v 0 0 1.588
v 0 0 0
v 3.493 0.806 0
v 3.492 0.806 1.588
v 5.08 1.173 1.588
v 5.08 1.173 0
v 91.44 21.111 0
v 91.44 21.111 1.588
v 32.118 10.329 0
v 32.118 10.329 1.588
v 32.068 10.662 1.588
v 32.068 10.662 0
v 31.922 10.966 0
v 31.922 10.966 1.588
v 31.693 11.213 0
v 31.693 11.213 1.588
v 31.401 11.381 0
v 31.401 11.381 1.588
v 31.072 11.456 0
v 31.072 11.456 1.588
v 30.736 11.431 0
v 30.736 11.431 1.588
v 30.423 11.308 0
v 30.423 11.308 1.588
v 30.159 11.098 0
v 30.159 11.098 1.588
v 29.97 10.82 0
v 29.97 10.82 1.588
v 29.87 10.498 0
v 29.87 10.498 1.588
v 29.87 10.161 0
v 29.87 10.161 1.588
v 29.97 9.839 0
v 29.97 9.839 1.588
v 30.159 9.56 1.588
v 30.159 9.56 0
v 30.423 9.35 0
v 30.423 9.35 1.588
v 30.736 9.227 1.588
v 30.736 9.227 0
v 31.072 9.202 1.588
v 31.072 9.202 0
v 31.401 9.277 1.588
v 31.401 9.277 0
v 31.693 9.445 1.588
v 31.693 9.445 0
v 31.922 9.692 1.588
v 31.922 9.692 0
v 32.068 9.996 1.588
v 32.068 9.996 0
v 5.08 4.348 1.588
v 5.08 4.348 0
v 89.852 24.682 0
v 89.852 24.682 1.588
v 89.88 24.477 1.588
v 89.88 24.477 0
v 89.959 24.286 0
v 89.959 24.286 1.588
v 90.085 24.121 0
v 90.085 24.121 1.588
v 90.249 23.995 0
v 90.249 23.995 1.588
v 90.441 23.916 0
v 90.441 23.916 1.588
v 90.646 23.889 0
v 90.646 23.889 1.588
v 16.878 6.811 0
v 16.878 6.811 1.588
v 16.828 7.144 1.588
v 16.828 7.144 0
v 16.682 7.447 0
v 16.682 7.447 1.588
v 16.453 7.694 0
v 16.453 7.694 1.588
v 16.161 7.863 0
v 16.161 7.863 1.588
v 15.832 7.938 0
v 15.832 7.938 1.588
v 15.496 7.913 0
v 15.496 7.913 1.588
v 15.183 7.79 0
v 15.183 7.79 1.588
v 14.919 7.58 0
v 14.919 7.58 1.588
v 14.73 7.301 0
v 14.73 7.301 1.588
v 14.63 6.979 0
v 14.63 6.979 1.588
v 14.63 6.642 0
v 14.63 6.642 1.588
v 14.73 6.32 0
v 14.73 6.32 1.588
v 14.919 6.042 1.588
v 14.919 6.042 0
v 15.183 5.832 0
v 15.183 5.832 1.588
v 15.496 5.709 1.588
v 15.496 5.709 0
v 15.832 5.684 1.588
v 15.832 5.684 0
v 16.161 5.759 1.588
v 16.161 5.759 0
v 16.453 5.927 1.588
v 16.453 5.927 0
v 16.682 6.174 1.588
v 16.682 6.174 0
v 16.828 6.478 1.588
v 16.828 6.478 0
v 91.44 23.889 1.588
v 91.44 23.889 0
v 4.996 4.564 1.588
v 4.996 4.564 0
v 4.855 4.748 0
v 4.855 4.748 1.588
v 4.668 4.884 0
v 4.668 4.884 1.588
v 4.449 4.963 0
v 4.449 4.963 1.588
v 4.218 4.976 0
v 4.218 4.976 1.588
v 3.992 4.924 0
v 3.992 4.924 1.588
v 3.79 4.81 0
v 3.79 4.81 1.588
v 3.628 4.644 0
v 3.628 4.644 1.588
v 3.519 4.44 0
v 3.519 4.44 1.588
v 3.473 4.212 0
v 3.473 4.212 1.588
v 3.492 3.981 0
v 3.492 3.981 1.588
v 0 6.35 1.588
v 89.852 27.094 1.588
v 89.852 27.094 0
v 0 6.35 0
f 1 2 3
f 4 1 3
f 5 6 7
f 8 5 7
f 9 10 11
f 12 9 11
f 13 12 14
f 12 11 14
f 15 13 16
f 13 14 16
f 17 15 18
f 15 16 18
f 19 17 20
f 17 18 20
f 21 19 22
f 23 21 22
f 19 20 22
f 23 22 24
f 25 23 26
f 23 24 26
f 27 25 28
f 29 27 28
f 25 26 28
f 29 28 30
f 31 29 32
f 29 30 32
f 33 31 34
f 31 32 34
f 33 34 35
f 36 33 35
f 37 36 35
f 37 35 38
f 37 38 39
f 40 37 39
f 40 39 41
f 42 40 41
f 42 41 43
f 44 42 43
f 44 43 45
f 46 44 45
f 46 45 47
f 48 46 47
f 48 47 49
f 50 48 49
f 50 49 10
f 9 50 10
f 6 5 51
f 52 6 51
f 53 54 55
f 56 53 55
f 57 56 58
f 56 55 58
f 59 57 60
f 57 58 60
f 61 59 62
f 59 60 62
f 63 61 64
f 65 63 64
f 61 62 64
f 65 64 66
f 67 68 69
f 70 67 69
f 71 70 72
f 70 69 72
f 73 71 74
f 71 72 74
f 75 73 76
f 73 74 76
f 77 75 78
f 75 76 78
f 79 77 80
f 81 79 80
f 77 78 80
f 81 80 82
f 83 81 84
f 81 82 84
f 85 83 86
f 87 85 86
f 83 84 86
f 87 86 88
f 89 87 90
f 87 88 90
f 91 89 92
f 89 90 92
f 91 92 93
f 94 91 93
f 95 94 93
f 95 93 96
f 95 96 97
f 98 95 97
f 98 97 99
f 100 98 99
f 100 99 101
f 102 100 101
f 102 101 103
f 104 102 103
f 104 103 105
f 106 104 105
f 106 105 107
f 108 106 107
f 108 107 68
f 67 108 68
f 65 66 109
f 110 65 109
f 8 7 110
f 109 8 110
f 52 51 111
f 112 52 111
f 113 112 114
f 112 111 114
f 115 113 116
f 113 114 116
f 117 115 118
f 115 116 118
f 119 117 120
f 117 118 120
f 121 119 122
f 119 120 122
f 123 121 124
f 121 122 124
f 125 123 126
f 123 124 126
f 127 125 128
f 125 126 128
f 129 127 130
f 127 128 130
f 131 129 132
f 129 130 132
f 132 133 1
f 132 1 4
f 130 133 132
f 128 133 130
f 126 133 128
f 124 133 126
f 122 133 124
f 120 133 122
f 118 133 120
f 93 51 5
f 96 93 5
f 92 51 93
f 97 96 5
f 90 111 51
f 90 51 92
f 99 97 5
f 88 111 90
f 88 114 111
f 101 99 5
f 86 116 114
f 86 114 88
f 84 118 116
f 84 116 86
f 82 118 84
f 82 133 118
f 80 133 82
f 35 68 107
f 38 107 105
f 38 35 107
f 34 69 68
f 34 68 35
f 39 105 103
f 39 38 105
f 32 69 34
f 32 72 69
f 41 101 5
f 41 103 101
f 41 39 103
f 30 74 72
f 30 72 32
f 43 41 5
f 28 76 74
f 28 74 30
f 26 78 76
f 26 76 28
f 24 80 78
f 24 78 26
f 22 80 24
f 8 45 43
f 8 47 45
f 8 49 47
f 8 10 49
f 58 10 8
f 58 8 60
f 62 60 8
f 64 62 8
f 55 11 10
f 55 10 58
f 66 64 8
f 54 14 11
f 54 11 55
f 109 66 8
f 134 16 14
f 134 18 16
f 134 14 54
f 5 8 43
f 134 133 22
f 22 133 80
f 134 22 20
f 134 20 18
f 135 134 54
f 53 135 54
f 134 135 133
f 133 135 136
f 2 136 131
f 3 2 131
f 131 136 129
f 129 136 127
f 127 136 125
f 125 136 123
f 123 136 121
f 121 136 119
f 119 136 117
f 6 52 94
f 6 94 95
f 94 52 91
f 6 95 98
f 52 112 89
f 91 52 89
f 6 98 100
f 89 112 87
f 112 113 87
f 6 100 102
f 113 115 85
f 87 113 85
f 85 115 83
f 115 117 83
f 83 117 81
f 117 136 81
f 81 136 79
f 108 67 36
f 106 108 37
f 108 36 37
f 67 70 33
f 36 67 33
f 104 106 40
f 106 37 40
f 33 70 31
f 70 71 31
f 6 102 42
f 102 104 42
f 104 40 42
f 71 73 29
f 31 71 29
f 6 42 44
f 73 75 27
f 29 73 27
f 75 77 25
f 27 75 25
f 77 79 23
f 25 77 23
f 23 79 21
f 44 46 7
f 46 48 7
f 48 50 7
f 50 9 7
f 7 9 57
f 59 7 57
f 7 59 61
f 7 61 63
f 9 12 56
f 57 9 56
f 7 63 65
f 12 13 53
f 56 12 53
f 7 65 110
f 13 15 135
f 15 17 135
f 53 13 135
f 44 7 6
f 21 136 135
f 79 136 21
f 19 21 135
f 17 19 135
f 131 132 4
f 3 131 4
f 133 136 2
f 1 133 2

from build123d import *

# Parameters (mm, degrees)
BOSS_EXTRUDE1_DEPTH = 1.5875
CUT_EXTRUDE1_REACH  = 97.488
SKETCH2_R           = 1.1303


with BuildPart() as part:
    # Sketch1 → Boss-Extrude1 (new body)
    with BuildSketch(Plane.XY):
        Polygon((91.44, 21.110587397), (91.44, 27.460587397), (0, 6.35), (0, 0), align=None)
    extrude(amount=BOSS_EXTRUDE1_DEPTH)

    # Sketch2 → Cut-Extrude1 (cut, up to next)
    with BuildSketch(Plane.XY.offset(1.5875), mode=Mode.PRIVATE) as cut_extrude1_sk1:
        with BuildLine():
            Line((3.4925, 0.806307158), (5.08, 1.172810411))
            Line((5.08, 1.172810411), (5.08, 4.347810411))
            ThreePointArc((5.08, 4.347810411), (4.102998373, 4.958308784), (3.4925, 3.981307158))
            Line((3.4925, 3.981307158), (3.4925, 0.806307158))
        make_face()
    cut_extrude1_tool1 = extrude(cut_extrude1_sk1.sketch, amount=-CUT_EXTRUDE1_REACH, mode=Mode.PRIVATE) & part.part
    # Sketch2 → Cut-Extrude1 (cut, up to next)
    with BuildSketch(Plane.XY.offset(1.5875), mode=Mode.PRIVATE) as cut_extrude1_sk2:
        with BuildLine():
            Line((91.44, 23.888712397), (91.44, 27.460587397))
            Line((91.44, 27.460587397), (89.8525, 27.094084143))
            Line((89.8525, 27.094084143), (89.8525, 24.682462397))
            ThreePointArc((89.8525, 24.682462397), (90.084983992, 24.121196389), (90.64625, 23.888712397))
            Line((90.64625, 23.888712397), (91.44, 23.888712397))
        make_face()
    cut_extrude1_tool2 = extrude(cut_extrude1_sk2.sketch, amount=-CUT_EXTRUDE1_REACH, mode=Mode.PRIVATE) & part.part
    # Sketch2 → Cut-Extrude1 (cut, up to next)
    with BuildSketch(Plane.XY.offset(1.5875), mode=Mode.PRIVATE) as cut_extrude1_sk3:
        with Locations((15.748, 6.810712274)):
            Circle(SKETCH2_R)
    cut_extrude1_tool3 = extrude(cut_extrude1_sk3.sketch, amount=-CUT_EXTRUDE1_REACH, mode=Mode.PRIVATE) & part.part
    # Sketch2 → Cut-Extrude1 (cut, up to next)
    with BuildSketch(Plane.XY.offset(1.5875), mode=Mode.PRIVATE) as cut_extrude1_sk4:
        with Locations((30.988, 10.329143507)):
            Circle(SKETCH2_R)
    cut_extrude1_tool4 = extrude(cut_extrude1_sk4.sketch, amount=-CUT_EXTRUDE1_REACH, mode=Mode.PRIVATE) & part.part
    add(cut_extrude1_tool1.solids().sort_by_distance((4.272922, 2.906844, 1.5875))[0], mode=Mode.SUBTRACT)
    add(cut_extrude1_tool2.solids().sort_by_distance((90.676821, 25.62383, 1.5875))[0], mode=Mode.SUBTRACT)
    add(cut_extrude1_tool3.solids().sort_by_distance((15.748, 6.810712, 1.5875))[0], mode=Mode.SUBTRACT)
    add(cut_extrude1_tool4.solids().sort_by_distance((30.988, 10.329144, 1.5875))[0], mode=Mode.SUBTRACT)


solid = part.part
